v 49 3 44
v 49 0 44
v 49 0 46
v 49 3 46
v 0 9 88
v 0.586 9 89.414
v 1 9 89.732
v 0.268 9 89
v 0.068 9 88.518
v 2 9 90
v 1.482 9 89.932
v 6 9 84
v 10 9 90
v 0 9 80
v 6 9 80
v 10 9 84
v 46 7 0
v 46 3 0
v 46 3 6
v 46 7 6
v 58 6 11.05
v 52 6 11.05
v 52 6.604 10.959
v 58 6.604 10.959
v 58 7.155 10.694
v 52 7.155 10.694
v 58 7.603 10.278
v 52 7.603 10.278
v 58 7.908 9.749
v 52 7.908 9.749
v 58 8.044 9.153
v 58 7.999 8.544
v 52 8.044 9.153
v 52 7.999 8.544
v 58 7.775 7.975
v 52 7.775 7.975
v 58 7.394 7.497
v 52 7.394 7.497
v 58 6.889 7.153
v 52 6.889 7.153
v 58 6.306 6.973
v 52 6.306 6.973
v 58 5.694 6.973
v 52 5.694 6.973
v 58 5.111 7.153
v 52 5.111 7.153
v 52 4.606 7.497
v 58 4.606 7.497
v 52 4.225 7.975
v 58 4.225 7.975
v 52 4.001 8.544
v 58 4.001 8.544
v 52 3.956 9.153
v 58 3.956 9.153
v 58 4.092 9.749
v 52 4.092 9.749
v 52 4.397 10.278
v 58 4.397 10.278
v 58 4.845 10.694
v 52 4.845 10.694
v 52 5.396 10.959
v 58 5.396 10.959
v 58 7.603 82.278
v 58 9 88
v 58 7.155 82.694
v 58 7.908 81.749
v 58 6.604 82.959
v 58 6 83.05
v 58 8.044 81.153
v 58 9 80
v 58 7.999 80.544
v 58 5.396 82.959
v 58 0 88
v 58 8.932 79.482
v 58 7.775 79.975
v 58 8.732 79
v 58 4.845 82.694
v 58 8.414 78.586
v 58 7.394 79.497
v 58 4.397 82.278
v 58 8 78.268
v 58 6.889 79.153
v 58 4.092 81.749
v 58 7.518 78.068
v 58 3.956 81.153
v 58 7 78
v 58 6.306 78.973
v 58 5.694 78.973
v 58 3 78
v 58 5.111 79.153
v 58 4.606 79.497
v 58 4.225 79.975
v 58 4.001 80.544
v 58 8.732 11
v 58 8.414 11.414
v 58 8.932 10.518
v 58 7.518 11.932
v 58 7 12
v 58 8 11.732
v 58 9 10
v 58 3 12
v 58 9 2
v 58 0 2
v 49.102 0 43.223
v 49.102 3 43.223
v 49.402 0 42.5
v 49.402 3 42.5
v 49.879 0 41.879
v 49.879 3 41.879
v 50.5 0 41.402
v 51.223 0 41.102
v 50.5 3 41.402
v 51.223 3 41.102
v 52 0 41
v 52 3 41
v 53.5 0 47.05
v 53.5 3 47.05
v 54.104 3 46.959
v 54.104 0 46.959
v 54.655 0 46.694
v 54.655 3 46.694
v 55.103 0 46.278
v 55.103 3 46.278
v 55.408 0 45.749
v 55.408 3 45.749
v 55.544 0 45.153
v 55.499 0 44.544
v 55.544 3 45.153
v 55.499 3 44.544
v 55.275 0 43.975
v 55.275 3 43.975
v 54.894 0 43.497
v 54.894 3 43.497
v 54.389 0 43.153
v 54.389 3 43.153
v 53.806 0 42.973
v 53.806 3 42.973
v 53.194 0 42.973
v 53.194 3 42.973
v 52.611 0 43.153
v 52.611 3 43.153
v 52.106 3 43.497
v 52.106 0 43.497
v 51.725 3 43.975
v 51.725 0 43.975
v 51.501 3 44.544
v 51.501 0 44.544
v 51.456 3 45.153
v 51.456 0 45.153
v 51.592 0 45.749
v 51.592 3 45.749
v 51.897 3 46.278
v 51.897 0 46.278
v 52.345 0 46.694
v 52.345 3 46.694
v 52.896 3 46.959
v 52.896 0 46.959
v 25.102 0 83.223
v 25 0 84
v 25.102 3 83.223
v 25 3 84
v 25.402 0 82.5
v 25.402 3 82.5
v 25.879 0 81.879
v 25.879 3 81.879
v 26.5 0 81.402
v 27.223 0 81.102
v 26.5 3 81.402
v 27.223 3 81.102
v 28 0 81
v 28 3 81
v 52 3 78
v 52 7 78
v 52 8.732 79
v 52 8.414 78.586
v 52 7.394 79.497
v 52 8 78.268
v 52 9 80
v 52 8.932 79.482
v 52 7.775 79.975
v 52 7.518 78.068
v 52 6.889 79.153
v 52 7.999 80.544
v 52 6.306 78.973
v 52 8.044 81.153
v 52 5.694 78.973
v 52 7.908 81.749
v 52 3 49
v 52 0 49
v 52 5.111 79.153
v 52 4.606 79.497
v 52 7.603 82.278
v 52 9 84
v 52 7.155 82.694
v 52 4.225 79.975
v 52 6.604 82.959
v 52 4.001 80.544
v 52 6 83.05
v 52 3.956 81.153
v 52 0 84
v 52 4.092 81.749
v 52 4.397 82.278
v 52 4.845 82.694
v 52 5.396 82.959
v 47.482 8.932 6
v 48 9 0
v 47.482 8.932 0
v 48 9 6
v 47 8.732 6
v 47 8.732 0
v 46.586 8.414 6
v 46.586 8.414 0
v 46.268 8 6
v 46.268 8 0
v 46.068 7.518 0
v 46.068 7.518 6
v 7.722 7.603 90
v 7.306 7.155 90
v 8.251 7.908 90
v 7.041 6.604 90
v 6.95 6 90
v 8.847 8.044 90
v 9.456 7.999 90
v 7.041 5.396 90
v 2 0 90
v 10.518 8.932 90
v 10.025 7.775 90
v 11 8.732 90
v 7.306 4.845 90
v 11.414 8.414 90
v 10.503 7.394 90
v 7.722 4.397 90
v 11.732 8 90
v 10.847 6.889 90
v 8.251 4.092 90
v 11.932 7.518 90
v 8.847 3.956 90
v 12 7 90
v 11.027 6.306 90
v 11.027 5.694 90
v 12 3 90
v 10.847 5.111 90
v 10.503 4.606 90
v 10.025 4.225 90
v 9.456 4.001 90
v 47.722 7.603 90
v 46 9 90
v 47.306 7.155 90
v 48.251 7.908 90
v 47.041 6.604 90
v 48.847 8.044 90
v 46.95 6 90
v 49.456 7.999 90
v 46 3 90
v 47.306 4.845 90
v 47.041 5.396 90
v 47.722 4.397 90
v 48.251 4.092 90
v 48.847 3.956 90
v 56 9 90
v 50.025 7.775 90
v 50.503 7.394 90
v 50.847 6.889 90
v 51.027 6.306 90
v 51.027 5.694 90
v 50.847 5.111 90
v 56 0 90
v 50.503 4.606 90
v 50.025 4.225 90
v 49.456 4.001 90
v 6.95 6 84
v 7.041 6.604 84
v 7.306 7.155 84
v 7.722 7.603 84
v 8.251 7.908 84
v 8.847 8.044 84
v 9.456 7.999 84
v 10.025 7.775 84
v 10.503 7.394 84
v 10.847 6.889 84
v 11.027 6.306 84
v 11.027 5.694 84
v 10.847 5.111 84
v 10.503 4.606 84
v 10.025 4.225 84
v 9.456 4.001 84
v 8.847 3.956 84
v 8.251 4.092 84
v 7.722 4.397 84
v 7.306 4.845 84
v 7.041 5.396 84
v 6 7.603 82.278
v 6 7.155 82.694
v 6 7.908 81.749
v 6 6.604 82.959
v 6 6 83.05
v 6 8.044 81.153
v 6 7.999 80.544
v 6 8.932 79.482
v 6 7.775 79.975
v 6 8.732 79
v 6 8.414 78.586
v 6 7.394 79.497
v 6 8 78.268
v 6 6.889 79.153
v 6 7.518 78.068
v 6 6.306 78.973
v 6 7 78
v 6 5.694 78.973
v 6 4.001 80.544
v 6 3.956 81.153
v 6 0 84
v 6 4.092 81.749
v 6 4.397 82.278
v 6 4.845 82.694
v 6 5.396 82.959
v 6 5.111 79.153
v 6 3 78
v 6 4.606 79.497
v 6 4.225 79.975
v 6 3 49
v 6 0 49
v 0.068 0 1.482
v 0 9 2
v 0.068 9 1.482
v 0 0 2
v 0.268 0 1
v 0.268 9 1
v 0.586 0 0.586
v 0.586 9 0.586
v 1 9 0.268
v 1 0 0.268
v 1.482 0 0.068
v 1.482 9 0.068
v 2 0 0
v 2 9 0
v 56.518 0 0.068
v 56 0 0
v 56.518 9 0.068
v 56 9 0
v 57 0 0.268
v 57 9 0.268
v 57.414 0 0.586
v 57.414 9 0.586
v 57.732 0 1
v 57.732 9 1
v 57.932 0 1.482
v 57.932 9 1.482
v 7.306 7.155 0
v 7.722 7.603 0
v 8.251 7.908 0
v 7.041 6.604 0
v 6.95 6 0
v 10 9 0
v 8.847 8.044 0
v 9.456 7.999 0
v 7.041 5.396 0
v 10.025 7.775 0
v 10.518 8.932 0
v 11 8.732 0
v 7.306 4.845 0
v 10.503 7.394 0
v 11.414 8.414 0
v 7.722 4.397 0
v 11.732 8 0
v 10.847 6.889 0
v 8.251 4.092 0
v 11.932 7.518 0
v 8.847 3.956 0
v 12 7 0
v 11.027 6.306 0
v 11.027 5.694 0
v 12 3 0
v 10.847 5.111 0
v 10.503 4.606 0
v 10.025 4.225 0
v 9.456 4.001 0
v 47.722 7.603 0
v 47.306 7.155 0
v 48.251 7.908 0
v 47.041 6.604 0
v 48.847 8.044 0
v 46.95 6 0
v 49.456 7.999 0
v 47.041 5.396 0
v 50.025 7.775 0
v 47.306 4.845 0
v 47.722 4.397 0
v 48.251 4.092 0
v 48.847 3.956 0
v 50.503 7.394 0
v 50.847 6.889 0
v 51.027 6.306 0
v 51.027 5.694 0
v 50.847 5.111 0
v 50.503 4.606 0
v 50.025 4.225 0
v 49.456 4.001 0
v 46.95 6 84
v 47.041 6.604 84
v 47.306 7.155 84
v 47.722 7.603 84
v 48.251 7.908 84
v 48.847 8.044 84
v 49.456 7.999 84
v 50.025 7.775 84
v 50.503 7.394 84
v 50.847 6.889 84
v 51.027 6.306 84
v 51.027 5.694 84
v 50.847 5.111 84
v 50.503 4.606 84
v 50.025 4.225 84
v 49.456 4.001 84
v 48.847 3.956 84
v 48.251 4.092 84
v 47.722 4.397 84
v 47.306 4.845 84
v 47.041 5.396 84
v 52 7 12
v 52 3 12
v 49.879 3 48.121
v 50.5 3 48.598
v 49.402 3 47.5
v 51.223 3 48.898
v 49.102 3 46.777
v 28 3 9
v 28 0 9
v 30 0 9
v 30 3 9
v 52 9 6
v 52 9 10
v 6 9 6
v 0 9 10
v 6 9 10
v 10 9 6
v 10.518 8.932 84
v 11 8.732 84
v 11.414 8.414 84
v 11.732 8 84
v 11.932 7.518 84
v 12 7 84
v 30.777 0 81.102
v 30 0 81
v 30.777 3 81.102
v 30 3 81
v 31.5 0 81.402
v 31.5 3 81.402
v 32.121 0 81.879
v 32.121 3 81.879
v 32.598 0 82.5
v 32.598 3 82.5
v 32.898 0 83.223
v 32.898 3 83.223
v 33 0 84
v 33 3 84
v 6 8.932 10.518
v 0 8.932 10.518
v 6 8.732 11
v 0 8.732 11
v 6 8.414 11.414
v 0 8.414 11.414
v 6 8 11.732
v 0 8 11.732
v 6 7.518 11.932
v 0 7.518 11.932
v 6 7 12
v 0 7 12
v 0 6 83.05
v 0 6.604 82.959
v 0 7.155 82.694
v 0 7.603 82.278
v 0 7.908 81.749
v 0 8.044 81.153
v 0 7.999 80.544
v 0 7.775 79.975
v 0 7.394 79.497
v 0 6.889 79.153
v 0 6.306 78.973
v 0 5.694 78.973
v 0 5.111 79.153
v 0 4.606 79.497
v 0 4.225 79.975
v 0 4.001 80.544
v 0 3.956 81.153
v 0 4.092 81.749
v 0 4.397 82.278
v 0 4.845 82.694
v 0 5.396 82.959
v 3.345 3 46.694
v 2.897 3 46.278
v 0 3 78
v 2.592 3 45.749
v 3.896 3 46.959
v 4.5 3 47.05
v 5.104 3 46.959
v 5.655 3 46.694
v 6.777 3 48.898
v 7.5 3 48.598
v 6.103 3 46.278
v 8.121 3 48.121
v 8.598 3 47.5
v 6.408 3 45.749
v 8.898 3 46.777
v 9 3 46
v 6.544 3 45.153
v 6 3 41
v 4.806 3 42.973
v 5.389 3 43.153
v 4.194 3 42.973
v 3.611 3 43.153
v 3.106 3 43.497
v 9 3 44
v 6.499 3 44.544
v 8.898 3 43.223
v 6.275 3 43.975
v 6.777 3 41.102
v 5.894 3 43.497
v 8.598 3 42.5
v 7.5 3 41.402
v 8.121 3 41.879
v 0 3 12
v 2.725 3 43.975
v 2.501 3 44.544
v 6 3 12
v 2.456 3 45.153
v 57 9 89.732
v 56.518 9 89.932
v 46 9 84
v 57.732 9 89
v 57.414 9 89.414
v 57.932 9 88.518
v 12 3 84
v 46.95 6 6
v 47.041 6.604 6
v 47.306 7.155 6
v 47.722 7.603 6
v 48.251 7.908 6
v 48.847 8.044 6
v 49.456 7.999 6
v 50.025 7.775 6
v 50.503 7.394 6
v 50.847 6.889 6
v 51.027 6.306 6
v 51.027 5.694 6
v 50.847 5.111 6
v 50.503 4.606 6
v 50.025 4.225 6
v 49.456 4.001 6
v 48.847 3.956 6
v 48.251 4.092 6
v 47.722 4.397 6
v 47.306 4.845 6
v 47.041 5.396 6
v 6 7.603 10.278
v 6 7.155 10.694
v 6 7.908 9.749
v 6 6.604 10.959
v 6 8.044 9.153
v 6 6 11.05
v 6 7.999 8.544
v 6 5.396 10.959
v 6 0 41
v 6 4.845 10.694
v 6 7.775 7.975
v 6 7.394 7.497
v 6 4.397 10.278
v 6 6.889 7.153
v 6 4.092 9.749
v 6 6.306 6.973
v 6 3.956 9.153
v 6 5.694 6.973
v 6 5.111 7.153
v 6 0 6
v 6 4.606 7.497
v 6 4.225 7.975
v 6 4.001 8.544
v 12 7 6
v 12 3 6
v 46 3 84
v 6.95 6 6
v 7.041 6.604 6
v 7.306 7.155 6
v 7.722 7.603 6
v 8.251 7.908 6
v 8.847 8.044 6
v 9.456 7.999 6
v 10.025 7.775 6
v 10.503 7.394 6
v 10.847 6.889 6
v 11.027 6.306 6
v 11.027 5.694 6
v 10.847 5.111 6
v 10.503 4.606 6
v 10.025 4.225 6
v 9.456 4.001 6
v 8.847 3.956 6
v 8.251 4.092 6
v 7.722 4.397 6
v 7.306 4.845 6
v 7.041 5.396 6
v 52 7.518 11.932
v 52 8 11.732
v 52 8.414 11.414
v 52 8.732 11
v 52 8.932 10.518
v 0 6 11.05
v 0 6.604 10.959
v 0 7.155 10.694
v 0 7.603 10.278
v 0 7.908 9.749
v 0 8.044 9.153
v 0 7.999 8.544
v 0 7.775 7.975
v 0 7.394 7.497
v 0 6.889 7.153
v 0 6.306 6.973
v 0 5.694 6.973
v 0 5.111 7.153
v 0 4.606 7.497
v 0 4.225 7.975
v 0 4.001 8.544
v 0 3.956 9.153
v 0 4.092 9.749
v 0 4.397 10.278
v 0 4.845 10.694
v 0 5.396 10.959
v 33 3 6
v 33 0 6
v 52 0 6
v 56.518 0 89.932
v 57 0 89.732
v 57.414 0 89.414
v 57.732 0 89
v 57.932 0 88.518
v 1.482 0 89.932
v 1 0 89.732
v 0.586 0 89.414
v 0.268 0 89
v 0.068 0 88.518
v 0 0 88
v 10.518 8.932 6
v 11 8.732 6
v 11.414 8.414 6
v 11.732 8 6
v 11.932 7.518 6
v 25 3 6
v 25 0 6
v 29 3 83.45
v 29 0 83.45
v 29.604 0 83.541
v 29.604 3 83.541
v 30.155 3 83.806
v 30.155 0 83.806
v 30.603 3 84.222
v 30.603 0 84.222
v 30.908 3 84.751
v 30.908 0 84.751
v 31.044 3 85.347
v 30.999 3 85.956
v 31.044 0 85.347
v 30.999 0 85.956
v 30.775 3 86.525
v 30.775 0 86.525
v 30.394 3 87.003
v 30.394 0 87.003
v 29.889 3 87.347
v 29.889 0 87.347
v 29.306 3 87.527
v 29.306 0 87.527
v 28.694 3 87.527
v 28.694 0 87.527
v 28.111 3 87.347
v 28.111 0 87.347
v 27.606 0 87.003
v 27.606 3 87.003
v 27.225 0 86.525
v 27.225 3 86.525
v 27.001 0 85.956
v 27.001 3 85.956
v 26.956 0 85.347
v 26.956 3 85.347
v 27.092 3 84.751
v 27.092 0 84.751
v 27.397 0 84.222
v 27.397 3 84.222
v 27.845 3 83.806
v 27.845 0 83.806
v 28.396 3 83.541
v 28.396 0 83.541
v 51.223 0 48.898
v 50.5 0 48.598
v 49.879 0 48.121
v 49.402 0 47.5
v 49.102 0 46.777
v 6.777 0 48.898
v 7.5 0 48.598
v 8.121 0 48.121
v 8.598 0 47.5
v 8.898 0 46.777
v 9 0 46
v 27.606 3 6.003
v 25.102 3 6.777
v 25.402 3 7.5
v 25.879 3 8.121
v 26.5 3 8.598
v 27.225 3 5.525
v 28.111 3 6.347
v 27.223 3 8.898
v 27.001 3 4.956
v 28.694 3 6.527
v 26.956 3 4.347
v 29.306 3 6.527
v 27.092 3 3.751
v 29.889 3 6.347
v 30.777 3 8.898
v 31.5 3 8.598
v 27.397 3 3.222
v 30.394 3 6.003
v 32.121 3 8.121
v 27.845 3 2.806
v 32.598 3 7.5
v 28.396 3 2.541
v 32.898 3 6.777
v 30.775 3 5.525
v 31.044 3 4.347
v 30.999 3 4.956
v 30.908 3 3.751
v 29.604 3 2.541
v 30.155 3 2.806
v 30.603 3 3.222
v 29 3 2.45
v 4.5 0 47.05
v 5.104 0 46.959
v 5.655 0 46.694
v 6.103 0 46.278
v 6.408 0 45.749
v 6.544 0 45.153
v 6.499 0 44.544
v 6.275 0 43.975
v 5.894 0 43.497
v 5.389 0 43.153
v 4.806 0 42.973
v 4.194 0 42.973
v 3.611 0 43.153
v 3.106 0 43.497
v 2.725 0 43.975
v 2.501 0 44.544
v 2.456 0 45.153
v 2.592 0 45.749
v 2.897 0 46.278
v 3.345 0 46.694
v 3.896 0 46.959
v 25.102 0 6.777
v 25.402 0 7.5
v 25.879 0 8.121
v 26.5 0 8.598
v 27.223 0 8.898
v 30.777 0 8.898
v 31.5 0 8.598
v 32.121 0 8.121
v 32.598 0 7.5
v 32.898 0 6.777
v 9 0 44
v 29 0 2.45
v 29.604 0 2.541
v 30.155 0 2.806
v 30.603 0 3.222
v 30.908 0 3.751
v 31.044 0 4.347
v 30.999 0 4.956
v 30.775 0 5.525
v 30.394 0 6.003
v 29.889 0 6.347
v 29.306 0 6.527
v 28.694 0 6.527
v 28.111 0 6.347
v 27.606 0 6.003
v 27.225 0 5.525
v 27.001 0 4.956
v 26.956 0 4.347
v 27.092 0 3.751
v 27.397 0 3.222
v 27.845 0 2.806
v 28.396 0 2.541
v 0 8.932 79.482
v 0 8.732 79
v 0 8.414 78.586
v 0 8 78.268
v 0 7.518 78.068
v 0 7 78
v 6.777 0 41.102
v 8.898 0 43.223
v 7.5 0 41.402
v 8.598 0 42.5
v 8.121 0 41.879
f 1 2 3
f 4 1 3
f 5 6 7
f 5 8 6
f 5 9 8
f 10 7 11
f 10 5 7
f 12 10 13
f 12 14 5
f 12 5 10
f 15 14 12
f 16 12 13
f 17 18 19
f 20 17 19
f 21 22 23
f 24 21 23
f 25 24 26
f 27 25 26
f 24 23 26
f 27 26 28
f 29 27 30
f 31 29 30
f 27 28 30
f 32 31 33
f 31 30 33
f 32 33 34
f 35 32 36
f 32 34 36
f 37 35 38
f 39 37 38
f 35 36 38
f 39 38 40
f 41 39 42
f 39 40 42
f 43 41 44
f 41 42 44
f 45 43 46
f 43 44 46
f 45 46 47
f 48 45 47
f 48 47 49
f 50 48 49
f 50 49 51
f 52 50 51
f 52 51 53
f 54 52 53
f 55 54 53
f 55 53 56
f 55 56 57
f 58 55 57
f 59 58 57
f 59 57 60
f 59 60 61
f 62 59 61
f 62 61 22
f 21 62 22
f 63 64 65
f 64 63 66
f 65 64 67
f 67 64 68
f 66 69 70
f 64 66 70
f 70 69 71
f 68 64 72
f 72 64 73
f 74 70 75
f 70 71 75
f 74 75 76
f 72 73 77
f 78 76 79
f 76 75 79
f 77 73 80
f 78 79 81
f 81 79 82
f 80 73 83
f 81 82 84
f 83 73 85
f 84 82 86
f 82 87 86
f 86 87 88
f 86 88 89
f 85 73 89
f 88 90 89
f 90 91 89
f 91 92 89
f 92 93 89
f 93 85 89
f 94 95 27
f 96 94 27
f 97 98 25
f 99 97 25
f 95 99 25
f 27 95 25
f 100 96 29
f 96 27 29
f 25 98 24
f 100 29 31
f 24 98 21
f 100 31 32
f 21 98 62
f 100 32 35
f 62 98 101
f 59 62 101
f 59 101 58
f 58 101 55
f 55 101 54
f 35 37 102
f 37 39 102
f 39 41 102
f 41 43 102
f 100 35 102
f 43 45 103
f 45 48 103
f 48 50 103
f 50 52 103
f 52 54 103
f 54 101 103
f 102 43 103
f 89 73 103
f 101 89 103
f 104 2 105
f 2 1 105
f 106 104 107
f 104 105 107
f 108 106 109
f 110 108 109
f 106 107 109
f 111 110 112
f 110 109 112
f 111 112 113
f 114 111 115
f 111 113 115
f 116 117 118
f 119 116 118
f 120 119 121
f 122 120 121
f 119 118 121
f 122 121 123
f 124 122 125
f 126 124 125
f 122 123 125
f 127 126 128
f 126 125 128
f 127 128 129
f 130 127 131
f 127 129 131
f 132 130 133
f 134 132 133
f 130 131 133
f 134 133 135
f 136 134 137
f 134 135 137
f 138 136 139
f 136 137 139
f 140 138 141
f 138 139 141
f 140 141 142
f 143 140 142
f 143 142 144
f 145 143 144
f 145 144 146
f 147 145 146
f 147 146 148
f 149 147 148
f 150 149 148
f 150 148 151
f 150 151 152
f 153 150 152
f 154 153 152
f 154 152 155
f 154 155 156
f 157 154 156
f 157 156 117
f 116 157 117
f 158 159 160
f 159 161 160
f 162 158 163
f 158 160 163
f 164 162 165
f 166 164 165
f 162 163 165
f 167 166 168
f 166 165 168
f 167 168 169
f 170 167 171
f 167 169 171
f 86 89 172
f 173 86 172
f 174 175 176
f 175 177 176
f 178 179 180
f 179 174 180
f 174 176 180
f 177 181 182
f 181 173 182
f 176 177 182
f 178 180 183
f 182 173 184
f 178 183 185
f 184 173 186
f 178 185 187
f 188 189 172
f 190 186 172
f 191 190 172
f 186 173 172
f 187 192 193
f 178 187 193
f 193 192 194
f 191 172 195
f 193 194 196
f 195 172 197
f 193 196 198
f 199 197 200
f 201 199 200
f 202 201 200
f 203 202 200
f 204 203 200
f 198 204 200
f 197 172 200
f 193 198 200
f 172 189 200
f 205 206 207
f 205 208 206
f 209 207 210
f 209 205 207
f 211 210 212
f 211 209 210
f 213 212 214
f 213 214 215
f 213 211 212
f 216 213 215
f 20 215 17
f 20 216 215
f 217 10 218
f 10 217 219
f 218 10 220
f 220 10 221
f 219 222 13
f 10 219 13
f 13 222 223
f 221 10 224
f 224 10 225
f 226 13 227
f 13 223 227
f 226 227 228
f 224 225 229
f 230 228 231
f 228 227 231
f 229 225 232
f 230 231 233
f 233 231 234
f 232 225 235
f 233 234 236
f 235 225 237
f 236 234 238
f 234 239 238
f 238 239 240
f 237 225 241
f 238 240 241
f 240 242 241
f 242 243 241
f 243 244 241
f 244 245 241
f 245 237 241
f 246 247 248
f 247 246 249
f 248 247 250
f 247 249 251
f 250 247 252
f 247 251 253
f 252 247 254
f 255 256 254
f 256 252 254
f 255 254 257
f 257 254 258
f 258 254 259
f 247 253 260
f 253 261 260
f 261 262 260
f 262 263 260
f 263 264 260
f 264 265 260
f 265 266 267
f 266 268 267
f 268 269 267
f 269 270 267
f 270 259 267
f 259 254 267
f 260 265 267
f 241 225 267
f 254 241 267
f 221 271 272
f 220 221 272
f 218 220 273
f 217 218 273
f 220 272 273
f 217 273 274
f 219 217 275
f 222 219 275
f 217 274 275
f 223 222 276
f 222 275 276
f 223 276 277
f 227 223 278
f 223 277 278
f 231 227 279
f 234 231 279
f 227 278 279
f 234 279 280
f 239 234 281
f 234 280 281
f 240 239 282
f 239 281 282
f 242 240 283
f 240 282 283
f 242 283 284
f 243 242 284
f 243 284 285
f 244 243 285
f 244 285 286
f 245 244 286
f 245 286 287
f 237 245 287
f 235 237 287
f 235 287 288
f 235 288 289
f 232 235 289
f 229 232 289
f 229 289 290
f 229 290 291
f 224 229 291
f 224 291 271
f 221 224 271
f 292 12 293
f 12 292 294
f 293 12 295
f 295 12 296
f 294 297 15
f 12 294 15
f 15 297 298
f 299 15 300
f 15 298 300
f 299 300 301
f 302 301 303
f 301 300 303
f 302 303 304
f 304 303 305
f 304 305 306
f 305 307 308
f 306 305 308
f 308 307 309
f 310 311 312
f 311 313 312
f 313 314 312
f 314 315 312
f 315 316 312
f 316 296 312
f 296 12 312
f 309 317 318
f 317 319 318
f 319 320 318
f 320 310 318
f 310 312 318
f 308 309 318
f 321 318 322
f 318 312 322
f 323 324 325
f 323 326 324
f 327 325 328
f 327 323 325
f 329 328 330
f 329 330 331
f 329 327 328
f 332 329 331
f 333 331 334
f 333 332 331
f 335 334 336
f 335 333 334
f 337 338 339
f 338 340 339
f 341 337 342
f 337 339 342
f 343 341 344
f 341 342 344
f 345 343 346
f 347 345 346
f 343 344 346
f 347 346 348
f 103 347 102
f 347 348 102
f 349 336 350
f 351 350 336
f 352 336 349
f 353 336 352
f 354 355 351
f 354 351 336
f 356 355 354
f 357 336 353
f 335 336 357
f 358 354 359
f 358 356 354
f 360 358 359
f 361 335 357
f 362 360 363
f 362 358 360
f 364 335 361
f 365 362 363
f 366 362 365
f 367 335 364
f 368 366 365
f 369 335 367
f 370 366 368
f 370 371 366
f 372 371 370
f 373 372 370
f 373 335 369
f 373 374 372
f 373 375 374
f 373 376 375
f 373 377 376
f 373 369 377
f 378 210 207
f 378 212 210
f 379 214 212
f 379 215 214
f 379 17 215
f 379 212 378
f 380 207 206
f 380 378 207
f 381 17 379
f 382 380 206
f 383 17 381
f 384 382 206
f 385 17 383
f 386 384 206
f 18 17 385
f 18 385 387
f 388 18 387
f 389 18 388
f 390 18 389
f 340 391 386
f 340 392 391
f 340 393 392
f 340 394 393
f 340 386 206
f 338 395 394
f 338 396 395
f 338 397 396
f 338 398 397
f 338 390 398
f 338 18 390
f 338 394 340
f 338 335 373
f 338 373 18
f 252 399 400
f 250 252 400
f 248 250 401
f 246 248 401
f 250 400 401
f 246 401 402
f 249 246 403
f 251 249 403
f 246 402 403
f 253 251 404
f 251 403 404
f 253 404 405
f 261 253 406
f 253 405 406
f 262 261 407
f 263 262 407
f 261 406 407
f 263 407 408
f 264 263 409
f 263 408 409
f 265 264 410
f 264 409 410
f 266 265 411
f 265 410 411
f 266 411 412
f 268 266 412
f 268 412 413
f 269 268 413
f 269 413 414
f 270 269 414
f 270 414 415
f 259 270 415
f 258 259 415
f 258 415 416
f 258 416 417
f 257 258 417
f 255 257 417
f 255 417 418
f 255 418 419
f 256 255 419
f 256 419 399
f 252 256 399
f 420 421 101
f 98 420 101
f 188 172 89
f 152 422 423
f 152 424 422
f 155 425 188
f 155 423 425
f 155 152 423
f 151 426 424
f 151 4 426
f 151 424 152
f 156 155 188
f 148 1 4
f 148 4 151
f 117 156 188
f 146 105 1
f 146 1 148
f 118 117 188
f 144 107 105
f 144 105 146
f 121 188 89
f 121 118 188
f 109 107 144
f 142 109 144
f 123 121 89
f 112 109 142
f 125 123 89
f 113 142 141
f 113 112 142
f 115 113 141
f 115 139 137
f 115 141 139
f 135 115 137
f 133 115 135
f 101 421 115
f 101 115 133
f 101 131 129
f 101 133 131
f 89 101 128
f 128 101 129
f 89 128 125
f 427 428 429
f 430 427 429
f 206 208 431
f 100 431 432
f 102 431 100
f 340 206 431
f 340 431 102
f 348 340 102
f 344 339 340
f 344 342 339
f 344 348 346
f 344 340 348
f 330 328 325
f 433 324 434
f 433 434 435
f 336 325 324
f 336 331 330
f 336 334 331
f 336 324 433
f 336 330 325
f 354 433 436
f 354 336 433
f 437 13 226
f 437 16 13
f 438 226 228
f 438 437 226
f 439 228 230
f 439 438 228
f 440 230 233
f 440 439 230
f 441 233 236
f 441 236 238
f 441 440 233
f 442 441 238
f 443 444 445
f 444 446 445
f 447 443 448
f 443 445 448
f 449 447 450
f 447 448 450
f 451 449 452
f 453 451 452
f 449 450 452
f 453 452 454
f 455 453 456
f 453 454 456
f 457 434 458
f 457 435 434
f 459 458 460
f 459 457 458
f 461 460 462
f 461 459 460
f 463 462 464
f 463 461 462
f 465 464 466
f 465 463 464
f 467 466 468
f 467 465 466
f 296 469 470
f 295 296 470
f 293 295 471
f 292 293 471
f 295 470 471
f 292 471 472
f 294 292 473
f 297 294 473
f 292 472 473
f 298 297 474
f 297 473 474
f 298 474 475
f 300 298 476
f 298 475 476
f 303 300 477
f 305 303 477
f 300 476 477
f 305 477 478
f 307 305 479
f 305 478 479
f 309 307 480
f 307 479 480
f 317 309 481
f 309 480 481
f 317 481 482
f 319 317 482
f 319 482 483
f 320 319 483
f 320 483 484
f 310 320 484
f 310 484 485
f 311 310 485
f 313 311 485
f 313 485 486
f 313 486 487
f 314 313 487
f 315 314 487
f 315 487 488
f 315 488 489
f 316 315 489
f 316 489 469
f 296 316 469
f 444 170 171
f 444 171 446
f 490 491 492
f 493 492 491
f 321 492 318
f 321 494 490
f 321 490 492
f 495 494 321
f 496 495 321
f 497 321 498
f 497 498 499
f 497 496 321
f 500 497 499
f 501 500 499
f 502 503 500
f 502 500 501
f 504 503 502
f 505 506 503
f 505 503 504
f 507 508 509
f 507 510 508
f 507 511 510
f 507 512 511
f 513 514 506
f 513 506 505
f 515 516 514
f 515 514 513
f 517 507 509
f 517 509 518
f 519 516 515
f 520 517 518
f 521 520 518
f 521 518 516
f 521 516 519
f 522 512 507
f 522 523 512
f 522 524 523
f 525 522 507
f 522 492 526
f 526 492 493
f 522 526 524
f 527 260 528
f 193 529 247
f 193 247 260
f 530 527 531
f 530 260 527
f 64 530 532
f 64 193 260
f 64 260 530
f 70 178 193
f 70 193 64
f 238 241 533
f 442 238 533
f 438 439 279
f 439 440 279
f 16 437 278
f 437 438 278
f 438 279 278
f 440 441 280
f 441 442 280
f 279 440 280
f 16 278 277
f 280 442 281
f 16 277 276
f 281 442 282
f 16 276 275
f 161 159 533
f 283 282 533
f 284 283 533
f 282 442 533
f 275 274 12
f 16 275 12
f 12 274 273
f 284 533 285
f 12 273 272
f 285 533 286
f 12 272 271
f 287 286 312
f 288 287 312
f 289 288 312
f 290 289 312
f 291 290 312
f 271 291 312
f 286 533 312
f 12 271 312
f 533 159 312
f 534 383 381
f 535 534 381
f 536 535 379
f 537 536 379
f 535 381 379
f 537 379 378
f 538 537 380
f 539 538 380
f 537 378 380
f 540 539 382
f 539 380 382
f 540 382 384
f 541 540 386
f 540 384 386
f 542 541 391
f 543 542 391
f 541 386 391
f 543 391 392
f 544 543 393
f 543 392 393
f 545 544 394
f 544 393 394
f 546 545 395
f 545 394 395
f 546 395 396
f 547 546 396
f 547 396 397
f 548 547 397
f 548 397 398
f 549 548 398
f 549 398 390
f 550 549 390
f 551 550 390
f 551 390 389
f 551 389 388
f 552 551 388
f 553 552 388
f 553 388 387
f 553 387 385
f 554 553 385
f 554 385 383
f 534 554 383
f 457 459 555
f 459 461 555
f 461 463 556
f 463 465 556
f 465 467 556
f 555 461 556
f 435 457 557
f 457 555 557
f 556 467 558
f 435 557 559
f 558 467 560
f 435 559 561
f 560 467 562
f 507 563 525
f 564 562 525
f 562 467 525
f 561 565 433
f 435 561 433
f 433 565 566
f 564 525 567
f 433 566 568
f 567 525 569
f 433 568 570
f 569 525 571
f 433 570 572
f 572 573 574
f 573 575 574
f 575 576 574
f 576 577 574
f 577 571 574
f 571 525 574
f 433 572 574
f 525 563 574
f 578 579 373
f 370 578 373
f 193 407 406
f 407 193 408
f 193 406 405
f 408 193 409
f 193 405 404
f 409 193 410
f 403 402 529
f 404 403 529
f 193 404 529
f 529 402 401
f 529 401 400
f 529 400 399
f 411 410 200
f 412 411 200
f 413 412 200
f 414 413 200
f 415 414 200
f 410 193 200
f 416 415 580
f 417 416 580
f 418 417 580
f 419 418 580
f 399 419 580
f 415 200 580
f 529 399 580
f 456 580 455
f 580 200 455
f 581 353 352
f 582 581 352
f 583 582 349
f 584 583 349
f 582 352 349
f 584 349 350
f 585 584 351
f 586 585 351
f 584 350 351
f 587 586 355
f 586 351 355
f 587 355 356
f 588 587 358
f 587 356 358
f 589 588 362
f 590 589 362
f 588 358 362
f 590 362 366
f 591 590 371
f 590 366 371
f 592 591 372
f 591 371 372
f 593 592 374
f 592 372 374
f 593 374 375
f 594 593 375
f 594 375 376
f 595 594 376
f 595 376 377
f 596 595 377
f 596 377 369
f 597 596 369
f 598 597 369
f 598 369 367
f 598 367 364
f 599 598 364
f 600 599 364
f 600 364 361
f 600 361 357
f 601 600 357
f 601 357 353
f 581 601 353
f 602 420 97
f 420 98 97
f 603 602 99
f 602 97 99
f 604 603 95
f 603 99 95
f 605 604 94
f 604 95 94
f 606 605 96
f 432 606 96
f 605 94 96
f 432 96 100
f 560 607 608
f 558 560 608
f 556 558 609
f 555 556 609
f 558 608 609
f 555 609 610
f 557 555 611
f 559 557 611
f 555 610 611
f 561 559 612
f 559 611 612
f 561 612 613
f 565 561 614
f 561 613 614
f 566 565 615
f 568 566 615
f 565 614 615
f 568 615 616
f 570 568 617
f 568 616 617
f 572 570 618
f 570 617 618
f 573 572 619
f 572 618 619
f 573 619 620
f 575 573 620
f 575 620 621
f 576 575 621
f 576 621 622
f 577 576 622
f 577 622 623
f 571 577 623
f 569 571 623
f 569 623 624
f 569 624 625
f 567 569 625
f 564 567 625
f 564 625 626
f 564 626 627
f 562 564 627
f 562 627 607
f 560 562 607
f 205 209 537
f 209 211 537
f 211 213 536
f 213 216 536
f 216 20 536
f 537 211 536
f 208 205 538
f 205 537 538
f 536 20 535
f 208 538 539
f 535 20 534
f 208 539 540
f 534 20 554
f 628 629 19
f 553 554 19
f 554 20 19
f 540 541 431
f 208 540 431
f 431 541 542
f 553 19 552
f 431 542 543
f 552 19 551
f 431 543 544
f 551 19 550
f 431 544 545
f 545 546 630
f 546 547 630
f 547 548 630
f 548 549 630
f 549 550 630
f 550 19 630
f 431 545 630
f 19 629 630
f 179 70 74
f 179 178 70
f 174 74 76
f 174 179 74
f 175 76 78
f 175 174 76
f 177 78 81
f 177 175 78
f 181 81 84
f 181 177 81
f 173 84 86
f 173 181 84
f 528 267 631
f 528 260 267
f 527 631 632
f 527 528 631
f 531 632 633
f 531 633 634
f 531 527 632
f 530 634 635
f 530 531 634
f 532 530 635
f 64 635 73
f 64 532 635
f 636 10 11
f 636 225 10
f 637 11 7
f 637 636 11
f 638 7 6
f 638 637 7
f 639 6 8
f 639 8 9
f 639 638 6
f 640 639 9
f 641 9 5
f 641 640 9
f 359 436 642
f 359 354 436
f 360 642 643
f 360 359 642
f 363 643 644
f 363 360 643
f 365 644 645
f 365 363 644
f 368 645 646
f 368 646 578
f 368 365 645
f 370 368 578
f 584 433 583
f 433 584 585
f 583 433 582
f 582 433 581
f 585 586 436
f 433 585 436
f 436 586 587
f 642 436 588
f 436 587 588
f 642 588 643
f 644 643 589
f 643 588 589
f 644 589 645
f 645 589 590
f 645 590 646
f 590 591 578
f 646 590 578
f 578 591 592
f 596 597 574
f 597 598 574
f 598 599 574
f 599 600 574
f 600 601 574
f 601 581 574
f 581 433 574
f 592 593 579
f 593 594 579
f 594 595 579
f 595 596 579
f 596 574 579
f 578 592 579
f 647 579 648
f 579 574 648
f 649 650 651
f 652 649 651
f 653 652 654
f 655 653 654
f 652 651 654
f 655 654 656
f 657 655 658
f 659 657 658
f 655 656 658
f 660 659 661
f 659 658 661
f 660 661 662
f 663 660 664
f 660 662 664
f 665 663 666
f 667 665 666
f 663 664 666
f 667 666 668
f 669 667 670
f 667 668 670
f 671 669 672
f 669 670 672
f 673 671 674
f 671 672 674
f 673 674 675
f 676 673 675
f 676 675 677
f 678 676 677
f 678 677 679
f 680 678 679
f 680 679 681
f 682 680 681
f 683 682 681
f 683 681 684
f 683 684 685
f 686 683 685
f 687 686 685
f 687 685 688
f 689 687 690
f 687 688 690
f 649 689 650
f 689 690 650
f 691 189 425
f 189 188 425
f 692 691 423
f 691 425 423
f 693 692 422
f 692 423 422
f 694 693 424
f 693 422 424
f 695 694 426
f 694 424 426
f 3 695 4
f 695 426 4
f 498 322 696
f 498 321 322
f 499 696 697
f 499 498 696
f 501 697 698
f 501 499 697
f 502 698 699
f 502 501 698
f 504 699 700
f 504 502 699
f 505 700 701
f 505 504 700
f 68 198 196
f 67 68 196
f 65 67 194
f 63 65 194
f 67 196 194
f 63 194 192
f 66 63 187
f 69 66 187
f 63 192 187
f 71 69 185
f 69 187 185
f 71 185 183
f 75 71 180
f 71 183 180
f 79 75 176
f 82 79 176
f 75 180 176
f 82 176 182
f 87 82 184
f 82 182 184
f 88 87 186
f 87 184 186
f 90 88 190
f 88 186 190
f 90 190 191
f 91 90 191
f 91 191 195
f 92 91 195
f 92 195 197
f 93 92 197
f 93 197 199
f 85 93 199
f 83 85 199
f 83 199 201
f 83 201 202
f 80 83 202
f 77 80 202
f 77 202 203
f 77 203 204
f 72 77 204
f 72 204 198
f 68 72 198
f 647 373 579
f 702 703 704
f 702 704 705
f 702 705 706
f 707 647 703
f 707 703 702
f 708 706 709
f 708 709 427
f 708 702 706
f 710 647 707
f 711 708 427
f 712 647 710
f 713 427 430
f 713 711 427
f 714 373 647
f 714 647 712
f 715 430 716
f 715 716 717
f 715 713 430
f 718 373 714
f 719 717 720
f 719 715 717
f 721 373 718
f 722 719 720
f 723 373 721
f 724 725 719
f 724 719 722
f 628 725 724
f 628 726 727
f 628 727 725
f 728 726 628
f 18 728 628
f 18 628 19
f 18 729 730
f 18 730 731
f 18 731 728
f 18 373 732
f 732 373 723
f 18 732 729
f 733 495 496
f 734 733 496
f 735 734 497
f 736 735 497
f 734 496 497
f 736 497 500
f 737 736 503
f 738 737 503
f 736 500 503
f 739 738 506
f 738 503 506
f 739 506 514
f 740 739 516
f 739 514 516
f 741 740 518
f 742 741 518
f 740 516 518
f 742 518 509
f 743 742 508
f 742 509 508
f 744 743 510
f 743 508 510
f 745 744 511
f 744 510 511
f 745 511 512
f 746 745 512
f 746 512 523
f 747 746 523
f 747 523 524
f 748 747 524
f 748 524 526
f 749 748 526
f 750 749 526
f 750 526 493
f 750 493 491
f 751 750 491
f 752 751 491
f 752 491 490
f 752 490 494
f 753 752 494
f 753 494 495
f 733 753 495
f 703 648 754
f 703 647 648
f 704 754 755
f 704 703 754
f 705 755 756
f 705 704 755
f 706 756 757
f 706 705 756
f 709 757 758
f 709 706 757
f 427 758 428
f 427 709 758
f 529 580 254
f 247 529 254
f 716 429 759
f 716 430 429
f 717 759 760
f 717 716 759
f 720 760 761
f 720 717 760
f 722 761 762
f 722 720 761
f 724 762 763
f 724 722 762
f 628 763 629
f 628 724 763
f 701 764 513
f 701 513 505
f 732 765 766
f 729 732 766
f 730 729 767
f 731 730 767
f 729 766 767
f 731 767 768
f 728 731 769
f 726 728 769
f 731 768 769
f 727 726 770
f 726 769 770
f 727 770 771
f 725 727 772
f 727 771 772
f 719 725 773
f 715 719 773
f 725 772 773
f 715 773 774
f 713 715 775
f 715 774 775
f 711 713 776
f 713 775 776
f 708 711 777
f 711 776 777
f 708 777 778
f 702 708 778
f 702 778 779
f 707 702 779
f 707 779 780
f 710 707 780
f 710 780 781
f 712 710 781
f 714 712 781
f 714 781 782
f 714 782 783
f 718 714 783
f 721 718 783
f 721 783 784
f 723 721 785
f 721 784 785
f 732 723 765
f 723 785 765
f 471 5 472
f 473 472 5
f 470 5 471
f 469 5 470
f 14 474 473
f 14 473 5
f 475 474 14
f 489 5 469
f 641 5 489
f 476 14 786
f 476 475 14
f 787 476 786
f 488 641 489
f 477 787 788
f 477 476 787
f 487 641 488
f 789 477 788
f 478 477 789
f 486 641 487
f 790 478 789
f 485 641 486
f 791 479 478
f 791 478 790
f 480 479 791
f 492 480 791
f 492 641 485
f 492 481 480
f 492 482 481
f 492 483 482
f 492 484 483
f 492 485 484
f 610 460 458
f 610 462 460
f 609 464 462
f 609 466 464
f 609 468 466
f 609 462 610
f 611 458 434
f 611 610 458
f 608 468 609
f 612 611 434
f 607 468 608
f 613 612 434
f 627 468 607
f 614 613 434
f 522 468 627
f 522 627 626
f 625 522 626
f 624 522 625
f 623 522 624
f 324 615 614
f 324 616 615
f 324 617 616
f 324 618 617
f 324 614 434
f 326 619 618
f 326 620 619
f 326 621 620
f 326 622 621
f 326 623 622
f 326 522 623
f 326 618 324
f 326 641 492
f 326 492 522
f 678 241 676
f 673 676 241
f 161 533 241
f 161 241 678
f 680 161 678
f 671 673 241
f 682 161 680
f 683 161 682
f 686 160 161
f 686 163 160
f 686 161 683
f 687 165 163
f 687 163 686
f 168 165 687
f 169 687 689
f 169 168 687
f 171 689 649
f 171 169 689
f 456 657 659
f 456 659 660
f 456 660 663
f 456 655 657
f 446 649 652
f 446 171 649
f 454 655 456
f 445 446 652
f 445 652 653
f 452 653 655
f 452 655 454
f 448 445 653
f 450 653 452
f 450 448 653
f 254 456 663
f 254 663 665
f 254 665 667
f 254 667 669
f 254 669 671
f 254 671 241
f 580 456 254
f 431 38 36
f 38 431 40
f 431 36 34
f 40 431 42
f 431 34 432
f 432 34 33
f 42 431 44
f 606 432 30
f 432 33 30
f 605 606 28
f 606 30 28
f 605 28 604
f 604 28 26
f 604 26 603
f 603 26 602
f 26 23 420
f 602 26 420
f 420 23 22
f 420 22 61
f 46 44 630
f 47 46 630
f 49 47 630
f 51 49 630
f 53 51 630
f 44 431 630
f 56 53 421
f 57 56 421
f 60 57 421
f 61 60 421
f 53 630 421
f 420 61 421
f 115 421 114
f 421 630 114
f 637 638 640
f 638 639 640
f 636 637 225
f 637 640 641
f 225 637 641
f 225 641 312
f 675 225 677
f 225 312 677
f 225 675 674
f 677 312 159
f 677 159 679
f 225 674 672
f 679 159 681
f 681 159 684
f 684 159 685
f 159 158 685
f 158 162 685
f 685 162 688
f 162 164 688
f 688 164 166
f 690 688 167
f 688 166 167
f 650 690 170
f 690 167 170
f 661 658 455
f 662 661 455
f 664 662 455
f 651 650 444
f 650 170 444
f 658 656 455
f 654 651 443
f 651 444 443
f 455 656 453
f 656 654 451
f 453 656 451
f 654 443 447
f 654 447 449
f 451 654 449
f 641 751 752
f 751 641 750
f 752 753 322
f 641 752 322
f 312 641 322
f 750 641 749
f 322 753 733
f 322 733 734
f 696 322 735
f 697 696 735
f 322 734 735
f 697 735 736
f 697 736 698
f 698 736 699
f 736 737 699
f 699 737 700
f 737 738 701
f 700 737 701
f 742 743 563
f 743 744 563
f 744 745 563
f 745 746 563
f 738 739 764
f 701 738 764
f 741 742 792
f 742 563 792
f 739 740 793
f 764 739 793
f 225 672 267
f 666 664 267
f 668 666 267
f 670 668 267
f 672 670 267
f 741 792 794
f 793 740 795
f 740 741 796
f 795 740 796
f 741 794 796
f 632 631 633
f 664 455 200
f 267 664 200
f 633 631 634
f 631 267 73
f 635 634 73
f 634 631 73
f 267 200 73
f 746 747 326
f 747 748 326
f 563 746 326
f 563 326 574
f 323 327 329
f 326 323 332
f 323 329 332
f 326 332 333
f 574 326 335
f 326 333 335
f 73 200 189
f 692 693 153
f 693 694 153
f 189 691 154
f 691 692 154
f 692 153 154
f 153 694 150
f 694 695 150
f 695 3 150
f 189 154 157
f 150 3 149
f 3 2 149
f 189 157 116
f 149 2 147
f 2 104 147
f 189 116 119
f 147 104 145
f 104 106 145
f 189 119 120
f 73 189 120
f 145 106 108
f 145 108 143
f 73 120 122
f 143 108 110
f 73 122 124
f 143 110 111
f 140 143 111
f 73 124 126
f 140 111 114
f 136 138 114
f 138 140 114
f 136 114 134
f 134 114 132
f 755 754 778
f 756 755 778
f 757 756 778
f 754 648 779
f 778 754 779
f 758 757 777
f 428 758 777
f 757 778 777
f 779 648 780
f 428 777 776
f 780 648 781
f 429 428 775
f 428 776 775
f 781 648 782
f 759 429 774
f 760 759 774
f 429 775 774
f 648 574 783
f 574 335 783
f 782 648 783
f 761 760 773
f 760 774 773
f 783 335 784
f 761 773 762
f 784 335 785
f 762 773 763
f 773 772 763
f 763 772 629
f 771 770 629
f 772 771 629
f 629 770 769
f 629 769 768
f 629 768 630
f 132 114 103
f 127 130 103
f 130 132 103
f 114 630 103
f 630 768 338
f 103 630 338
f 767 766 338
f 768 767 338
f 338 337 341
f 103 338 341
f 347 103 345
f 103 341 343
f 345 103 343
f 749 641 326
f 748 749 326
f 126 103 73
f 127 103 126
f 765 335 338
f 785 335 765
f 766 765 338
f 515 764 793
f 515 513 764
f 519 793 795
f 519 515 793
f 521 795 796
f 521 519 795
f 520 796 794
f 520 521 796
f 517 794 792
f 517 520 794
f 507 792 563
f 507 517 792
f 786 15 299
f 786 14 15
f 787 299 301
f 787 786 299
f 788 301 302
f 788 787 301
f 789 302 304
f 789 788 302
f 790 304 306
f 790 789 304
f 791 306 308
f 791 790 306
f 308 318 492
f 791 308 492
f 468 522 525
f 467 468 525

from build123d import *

# Parameters (mm, degrees)
SKETCH1_W           = 58
SKETCH1_H           = 90
SKETCH1_W_2         = 46
SKETCH1_H_2         = 78
BOSS_EXTRUDE1_DEPTH = 3
BOSS_EXTRUDE2_DEPTH = 6
SKETCH3_R           = 2.05
CUT_EXTRUDE1_DEPTH  = 108.447661678
SKETCH4_R           = 2.05
CUT_EXTRUDE2_DEPTH  = 108.447661678
FILLET1_R           = 2
FILLET2_R           = 2
SKETCH5_W           = 8
SKETCH5_H           = 3
BOSS_EXTRUDE3_DEPTH = 3
SKETCH6_R           = 2.05
CUT_EXTRUDE3_DEPTH  = 3
FILLET3_R           = 3
SKETCH7_W           = 3
SKETCH7_H           = 8
BOSS_EXTRUDE4_DEPTH = 3
SKETCH8_R           = 2.05
CUT_EXTRUDE4_DEPTH  = 108.238052948
FILLET4_R           = 3


with BuildPart() as part:
    # Sketch1 → Boss-Extrude1 (new body)
    with BuildSketch(Plane(origin=(0, 0, 0), x_dir=(1, 0, 0), z_dir=(0, 1, 0))):
        with Locations((29, -45)):
            Rectangle(SKETCH1_W, SKETCH1_H)
        with Locations((29, -45)):
            Rectangle(SKETCH1_W_2, SKETCH1_H_2, mode=Mode.SUBTRACT)
    extrude(amount=BOSS_EXTRUDE1_DEPTH)

    # Sketch2 → Boss-Extrude2 (add)
    with BuildSketch(Plane(origin=(0, 3, 0), x_dir=(1, 0, 0), z_dir=(0, 1, 0))):
        Polygon((46, -84), (46, -90), (58, -90), (58, -78), (52, -78), (52, -84), align=None)
        Polygon((52, -12), (58, -12), (58, 0), (46, 0), (46, -6), (52, -6), align=None)
        Polygon((0, 0), (0, -12), (6, -12), (6, -6), (12, -6), (12, 0), align=None)
        Polygon((0, -90), (12, -90), (12, -84), (6, -84), (6, -78), (0, -78), align=None)
    extrude(amount=BOSS_EXTRUDE2_DEPTH)

    # Sketch3 → Cut-Extrude1 (cut, through all)
    with BuildSketch(Plane.ZY):
        with Locations((9, 6)):
            Circle(SKETCH3_R)
        with Locations((81, 6)):
            Circle(SKETCH3_R)
    extrude(amount=-CUT_EXTRUDE1_DEPTH, mode=Mode.SUBTRACT)

    # Sketch4 → Cut-Extrude2 (cut, through all)
    with BuildSketch(Plane(origin=(0, 0, 0), x_dir=(-1, 0, 0), z_dir=(0, 0, -1))):
        with Locations((-49, 6)):
            Circle(SKETCH4_R)
        with Locations((-9, 6)):
            Circle(SKETCH4_R)
    extrude(amount=-CUT_EXTRUDE2_DEPTH, mode=Mode.SUBTRACT)

    # Fillet1
    fillet1_edges = [part.edges().sort_by_distance(p)[0] for p in [
        (55, 9, 78),
        (55, 9, 12),
        (46, 9, 3),
        (3, 9, 12),
        (12, 9, 3),
        (3, 9, 78),
        (12, 9, 87),
    ]]
    fillet(fillet1_edges, radius=FILLET1_R)

    # Fillet2
    fillet2_edges = [part.edges().sort_by_distance(p)[0] for p in [
        (0, 4.5, 0),
        (58, 4.5, 0),
        (58, 4.5, 90),
        (0, 4.5, 90),
    ]]
    fillet(fillet2_edges, radius=FILLET2_R)

    # Sketch5 → Boss-Extrude3 (add)
    with BuildSketch(Plane.XZ):
        with Locations((29, 7.5)):
            Rectangle(SKETCH5_W, SKETCH5_H)
        with Locations((29, 82.5)):
            Rectangle(SKETCH5_W, SKETCH5_H)
    extrude(amount=-BOSS_EXTRUDE3_DEPTH)

    # Sketch6 → Cut-Extrude3 (cut)
    with BuildSketch(Plane.XZ):
        with Locations(Location((29, 85.5, 0), (0, 0, 270))):
            Circle(SKETCH6_R)
        with Locations(Location((29, 4.5, 0), (0, 0, 270))):
            Circle(SKETCH6_R)
    extrude(amount=-CUT_EXTRUDE3_DEPTH, mode=Mode.SUBTRACT)

    # Fillet3
    fillet3_edges = [part.edges().sort_by_distance(p)[0] for p in [
        (33, 1.5, 81),
        (25, 1.5, 81),
        (33, 1.5, 9),
        (25, 1.5, 9),
    ]]
    fillet(fillet3_edges, radius=FILLET3_R - 0.0001)  # a hair under: the kernel refuses the full size

    # Sketch7 → Boss-Extrude4 (add)
    with BuildSketch(Plane.XZ):
        with Locations((50.5, 45)):
            Rectangle(SKETCH7_W, SKETCH7_H)
        with Locations((7.5, 45)):
            Rectangle(SKETCH7_W, SKETCH7_H)
    extrude(amount=-BOSS_EXTRUDE4_DEPTH)

    # Sketch8 → Cut-Extrude4 (cut, through all)
    with BuildSketch(Plane(origin=(0, 3, 0), x_dir=(1, 0, 0), z_dir=(0, 1, 0))):
        with Locations(Location((4.5, -45, 0), (0, 0, 270))):
            Circle(SKETCH8_R)
        with Locations(Location((53.5, -45, 0), (0, 0, 270))):
            Circle(SKETCH8_R)
    extrude(amount=-CUT_EXTRUDE4_DEPTH, mode=Mode.SUBTRACT)

    # Fillet4
    fillet4_edges = [part.edges().sort_by_distance(p)[0] for p in [
        (49, 1.5, 41),
        (49, 1.5, 49),
        (9, 1.5, 41),
        (9, 1.5, 49),
    ]]
    fillet(fillet4_edges, radius=FILLET4_R - 0.0001)  # a hair under: the kernel refuses the full size


solid = part.part
